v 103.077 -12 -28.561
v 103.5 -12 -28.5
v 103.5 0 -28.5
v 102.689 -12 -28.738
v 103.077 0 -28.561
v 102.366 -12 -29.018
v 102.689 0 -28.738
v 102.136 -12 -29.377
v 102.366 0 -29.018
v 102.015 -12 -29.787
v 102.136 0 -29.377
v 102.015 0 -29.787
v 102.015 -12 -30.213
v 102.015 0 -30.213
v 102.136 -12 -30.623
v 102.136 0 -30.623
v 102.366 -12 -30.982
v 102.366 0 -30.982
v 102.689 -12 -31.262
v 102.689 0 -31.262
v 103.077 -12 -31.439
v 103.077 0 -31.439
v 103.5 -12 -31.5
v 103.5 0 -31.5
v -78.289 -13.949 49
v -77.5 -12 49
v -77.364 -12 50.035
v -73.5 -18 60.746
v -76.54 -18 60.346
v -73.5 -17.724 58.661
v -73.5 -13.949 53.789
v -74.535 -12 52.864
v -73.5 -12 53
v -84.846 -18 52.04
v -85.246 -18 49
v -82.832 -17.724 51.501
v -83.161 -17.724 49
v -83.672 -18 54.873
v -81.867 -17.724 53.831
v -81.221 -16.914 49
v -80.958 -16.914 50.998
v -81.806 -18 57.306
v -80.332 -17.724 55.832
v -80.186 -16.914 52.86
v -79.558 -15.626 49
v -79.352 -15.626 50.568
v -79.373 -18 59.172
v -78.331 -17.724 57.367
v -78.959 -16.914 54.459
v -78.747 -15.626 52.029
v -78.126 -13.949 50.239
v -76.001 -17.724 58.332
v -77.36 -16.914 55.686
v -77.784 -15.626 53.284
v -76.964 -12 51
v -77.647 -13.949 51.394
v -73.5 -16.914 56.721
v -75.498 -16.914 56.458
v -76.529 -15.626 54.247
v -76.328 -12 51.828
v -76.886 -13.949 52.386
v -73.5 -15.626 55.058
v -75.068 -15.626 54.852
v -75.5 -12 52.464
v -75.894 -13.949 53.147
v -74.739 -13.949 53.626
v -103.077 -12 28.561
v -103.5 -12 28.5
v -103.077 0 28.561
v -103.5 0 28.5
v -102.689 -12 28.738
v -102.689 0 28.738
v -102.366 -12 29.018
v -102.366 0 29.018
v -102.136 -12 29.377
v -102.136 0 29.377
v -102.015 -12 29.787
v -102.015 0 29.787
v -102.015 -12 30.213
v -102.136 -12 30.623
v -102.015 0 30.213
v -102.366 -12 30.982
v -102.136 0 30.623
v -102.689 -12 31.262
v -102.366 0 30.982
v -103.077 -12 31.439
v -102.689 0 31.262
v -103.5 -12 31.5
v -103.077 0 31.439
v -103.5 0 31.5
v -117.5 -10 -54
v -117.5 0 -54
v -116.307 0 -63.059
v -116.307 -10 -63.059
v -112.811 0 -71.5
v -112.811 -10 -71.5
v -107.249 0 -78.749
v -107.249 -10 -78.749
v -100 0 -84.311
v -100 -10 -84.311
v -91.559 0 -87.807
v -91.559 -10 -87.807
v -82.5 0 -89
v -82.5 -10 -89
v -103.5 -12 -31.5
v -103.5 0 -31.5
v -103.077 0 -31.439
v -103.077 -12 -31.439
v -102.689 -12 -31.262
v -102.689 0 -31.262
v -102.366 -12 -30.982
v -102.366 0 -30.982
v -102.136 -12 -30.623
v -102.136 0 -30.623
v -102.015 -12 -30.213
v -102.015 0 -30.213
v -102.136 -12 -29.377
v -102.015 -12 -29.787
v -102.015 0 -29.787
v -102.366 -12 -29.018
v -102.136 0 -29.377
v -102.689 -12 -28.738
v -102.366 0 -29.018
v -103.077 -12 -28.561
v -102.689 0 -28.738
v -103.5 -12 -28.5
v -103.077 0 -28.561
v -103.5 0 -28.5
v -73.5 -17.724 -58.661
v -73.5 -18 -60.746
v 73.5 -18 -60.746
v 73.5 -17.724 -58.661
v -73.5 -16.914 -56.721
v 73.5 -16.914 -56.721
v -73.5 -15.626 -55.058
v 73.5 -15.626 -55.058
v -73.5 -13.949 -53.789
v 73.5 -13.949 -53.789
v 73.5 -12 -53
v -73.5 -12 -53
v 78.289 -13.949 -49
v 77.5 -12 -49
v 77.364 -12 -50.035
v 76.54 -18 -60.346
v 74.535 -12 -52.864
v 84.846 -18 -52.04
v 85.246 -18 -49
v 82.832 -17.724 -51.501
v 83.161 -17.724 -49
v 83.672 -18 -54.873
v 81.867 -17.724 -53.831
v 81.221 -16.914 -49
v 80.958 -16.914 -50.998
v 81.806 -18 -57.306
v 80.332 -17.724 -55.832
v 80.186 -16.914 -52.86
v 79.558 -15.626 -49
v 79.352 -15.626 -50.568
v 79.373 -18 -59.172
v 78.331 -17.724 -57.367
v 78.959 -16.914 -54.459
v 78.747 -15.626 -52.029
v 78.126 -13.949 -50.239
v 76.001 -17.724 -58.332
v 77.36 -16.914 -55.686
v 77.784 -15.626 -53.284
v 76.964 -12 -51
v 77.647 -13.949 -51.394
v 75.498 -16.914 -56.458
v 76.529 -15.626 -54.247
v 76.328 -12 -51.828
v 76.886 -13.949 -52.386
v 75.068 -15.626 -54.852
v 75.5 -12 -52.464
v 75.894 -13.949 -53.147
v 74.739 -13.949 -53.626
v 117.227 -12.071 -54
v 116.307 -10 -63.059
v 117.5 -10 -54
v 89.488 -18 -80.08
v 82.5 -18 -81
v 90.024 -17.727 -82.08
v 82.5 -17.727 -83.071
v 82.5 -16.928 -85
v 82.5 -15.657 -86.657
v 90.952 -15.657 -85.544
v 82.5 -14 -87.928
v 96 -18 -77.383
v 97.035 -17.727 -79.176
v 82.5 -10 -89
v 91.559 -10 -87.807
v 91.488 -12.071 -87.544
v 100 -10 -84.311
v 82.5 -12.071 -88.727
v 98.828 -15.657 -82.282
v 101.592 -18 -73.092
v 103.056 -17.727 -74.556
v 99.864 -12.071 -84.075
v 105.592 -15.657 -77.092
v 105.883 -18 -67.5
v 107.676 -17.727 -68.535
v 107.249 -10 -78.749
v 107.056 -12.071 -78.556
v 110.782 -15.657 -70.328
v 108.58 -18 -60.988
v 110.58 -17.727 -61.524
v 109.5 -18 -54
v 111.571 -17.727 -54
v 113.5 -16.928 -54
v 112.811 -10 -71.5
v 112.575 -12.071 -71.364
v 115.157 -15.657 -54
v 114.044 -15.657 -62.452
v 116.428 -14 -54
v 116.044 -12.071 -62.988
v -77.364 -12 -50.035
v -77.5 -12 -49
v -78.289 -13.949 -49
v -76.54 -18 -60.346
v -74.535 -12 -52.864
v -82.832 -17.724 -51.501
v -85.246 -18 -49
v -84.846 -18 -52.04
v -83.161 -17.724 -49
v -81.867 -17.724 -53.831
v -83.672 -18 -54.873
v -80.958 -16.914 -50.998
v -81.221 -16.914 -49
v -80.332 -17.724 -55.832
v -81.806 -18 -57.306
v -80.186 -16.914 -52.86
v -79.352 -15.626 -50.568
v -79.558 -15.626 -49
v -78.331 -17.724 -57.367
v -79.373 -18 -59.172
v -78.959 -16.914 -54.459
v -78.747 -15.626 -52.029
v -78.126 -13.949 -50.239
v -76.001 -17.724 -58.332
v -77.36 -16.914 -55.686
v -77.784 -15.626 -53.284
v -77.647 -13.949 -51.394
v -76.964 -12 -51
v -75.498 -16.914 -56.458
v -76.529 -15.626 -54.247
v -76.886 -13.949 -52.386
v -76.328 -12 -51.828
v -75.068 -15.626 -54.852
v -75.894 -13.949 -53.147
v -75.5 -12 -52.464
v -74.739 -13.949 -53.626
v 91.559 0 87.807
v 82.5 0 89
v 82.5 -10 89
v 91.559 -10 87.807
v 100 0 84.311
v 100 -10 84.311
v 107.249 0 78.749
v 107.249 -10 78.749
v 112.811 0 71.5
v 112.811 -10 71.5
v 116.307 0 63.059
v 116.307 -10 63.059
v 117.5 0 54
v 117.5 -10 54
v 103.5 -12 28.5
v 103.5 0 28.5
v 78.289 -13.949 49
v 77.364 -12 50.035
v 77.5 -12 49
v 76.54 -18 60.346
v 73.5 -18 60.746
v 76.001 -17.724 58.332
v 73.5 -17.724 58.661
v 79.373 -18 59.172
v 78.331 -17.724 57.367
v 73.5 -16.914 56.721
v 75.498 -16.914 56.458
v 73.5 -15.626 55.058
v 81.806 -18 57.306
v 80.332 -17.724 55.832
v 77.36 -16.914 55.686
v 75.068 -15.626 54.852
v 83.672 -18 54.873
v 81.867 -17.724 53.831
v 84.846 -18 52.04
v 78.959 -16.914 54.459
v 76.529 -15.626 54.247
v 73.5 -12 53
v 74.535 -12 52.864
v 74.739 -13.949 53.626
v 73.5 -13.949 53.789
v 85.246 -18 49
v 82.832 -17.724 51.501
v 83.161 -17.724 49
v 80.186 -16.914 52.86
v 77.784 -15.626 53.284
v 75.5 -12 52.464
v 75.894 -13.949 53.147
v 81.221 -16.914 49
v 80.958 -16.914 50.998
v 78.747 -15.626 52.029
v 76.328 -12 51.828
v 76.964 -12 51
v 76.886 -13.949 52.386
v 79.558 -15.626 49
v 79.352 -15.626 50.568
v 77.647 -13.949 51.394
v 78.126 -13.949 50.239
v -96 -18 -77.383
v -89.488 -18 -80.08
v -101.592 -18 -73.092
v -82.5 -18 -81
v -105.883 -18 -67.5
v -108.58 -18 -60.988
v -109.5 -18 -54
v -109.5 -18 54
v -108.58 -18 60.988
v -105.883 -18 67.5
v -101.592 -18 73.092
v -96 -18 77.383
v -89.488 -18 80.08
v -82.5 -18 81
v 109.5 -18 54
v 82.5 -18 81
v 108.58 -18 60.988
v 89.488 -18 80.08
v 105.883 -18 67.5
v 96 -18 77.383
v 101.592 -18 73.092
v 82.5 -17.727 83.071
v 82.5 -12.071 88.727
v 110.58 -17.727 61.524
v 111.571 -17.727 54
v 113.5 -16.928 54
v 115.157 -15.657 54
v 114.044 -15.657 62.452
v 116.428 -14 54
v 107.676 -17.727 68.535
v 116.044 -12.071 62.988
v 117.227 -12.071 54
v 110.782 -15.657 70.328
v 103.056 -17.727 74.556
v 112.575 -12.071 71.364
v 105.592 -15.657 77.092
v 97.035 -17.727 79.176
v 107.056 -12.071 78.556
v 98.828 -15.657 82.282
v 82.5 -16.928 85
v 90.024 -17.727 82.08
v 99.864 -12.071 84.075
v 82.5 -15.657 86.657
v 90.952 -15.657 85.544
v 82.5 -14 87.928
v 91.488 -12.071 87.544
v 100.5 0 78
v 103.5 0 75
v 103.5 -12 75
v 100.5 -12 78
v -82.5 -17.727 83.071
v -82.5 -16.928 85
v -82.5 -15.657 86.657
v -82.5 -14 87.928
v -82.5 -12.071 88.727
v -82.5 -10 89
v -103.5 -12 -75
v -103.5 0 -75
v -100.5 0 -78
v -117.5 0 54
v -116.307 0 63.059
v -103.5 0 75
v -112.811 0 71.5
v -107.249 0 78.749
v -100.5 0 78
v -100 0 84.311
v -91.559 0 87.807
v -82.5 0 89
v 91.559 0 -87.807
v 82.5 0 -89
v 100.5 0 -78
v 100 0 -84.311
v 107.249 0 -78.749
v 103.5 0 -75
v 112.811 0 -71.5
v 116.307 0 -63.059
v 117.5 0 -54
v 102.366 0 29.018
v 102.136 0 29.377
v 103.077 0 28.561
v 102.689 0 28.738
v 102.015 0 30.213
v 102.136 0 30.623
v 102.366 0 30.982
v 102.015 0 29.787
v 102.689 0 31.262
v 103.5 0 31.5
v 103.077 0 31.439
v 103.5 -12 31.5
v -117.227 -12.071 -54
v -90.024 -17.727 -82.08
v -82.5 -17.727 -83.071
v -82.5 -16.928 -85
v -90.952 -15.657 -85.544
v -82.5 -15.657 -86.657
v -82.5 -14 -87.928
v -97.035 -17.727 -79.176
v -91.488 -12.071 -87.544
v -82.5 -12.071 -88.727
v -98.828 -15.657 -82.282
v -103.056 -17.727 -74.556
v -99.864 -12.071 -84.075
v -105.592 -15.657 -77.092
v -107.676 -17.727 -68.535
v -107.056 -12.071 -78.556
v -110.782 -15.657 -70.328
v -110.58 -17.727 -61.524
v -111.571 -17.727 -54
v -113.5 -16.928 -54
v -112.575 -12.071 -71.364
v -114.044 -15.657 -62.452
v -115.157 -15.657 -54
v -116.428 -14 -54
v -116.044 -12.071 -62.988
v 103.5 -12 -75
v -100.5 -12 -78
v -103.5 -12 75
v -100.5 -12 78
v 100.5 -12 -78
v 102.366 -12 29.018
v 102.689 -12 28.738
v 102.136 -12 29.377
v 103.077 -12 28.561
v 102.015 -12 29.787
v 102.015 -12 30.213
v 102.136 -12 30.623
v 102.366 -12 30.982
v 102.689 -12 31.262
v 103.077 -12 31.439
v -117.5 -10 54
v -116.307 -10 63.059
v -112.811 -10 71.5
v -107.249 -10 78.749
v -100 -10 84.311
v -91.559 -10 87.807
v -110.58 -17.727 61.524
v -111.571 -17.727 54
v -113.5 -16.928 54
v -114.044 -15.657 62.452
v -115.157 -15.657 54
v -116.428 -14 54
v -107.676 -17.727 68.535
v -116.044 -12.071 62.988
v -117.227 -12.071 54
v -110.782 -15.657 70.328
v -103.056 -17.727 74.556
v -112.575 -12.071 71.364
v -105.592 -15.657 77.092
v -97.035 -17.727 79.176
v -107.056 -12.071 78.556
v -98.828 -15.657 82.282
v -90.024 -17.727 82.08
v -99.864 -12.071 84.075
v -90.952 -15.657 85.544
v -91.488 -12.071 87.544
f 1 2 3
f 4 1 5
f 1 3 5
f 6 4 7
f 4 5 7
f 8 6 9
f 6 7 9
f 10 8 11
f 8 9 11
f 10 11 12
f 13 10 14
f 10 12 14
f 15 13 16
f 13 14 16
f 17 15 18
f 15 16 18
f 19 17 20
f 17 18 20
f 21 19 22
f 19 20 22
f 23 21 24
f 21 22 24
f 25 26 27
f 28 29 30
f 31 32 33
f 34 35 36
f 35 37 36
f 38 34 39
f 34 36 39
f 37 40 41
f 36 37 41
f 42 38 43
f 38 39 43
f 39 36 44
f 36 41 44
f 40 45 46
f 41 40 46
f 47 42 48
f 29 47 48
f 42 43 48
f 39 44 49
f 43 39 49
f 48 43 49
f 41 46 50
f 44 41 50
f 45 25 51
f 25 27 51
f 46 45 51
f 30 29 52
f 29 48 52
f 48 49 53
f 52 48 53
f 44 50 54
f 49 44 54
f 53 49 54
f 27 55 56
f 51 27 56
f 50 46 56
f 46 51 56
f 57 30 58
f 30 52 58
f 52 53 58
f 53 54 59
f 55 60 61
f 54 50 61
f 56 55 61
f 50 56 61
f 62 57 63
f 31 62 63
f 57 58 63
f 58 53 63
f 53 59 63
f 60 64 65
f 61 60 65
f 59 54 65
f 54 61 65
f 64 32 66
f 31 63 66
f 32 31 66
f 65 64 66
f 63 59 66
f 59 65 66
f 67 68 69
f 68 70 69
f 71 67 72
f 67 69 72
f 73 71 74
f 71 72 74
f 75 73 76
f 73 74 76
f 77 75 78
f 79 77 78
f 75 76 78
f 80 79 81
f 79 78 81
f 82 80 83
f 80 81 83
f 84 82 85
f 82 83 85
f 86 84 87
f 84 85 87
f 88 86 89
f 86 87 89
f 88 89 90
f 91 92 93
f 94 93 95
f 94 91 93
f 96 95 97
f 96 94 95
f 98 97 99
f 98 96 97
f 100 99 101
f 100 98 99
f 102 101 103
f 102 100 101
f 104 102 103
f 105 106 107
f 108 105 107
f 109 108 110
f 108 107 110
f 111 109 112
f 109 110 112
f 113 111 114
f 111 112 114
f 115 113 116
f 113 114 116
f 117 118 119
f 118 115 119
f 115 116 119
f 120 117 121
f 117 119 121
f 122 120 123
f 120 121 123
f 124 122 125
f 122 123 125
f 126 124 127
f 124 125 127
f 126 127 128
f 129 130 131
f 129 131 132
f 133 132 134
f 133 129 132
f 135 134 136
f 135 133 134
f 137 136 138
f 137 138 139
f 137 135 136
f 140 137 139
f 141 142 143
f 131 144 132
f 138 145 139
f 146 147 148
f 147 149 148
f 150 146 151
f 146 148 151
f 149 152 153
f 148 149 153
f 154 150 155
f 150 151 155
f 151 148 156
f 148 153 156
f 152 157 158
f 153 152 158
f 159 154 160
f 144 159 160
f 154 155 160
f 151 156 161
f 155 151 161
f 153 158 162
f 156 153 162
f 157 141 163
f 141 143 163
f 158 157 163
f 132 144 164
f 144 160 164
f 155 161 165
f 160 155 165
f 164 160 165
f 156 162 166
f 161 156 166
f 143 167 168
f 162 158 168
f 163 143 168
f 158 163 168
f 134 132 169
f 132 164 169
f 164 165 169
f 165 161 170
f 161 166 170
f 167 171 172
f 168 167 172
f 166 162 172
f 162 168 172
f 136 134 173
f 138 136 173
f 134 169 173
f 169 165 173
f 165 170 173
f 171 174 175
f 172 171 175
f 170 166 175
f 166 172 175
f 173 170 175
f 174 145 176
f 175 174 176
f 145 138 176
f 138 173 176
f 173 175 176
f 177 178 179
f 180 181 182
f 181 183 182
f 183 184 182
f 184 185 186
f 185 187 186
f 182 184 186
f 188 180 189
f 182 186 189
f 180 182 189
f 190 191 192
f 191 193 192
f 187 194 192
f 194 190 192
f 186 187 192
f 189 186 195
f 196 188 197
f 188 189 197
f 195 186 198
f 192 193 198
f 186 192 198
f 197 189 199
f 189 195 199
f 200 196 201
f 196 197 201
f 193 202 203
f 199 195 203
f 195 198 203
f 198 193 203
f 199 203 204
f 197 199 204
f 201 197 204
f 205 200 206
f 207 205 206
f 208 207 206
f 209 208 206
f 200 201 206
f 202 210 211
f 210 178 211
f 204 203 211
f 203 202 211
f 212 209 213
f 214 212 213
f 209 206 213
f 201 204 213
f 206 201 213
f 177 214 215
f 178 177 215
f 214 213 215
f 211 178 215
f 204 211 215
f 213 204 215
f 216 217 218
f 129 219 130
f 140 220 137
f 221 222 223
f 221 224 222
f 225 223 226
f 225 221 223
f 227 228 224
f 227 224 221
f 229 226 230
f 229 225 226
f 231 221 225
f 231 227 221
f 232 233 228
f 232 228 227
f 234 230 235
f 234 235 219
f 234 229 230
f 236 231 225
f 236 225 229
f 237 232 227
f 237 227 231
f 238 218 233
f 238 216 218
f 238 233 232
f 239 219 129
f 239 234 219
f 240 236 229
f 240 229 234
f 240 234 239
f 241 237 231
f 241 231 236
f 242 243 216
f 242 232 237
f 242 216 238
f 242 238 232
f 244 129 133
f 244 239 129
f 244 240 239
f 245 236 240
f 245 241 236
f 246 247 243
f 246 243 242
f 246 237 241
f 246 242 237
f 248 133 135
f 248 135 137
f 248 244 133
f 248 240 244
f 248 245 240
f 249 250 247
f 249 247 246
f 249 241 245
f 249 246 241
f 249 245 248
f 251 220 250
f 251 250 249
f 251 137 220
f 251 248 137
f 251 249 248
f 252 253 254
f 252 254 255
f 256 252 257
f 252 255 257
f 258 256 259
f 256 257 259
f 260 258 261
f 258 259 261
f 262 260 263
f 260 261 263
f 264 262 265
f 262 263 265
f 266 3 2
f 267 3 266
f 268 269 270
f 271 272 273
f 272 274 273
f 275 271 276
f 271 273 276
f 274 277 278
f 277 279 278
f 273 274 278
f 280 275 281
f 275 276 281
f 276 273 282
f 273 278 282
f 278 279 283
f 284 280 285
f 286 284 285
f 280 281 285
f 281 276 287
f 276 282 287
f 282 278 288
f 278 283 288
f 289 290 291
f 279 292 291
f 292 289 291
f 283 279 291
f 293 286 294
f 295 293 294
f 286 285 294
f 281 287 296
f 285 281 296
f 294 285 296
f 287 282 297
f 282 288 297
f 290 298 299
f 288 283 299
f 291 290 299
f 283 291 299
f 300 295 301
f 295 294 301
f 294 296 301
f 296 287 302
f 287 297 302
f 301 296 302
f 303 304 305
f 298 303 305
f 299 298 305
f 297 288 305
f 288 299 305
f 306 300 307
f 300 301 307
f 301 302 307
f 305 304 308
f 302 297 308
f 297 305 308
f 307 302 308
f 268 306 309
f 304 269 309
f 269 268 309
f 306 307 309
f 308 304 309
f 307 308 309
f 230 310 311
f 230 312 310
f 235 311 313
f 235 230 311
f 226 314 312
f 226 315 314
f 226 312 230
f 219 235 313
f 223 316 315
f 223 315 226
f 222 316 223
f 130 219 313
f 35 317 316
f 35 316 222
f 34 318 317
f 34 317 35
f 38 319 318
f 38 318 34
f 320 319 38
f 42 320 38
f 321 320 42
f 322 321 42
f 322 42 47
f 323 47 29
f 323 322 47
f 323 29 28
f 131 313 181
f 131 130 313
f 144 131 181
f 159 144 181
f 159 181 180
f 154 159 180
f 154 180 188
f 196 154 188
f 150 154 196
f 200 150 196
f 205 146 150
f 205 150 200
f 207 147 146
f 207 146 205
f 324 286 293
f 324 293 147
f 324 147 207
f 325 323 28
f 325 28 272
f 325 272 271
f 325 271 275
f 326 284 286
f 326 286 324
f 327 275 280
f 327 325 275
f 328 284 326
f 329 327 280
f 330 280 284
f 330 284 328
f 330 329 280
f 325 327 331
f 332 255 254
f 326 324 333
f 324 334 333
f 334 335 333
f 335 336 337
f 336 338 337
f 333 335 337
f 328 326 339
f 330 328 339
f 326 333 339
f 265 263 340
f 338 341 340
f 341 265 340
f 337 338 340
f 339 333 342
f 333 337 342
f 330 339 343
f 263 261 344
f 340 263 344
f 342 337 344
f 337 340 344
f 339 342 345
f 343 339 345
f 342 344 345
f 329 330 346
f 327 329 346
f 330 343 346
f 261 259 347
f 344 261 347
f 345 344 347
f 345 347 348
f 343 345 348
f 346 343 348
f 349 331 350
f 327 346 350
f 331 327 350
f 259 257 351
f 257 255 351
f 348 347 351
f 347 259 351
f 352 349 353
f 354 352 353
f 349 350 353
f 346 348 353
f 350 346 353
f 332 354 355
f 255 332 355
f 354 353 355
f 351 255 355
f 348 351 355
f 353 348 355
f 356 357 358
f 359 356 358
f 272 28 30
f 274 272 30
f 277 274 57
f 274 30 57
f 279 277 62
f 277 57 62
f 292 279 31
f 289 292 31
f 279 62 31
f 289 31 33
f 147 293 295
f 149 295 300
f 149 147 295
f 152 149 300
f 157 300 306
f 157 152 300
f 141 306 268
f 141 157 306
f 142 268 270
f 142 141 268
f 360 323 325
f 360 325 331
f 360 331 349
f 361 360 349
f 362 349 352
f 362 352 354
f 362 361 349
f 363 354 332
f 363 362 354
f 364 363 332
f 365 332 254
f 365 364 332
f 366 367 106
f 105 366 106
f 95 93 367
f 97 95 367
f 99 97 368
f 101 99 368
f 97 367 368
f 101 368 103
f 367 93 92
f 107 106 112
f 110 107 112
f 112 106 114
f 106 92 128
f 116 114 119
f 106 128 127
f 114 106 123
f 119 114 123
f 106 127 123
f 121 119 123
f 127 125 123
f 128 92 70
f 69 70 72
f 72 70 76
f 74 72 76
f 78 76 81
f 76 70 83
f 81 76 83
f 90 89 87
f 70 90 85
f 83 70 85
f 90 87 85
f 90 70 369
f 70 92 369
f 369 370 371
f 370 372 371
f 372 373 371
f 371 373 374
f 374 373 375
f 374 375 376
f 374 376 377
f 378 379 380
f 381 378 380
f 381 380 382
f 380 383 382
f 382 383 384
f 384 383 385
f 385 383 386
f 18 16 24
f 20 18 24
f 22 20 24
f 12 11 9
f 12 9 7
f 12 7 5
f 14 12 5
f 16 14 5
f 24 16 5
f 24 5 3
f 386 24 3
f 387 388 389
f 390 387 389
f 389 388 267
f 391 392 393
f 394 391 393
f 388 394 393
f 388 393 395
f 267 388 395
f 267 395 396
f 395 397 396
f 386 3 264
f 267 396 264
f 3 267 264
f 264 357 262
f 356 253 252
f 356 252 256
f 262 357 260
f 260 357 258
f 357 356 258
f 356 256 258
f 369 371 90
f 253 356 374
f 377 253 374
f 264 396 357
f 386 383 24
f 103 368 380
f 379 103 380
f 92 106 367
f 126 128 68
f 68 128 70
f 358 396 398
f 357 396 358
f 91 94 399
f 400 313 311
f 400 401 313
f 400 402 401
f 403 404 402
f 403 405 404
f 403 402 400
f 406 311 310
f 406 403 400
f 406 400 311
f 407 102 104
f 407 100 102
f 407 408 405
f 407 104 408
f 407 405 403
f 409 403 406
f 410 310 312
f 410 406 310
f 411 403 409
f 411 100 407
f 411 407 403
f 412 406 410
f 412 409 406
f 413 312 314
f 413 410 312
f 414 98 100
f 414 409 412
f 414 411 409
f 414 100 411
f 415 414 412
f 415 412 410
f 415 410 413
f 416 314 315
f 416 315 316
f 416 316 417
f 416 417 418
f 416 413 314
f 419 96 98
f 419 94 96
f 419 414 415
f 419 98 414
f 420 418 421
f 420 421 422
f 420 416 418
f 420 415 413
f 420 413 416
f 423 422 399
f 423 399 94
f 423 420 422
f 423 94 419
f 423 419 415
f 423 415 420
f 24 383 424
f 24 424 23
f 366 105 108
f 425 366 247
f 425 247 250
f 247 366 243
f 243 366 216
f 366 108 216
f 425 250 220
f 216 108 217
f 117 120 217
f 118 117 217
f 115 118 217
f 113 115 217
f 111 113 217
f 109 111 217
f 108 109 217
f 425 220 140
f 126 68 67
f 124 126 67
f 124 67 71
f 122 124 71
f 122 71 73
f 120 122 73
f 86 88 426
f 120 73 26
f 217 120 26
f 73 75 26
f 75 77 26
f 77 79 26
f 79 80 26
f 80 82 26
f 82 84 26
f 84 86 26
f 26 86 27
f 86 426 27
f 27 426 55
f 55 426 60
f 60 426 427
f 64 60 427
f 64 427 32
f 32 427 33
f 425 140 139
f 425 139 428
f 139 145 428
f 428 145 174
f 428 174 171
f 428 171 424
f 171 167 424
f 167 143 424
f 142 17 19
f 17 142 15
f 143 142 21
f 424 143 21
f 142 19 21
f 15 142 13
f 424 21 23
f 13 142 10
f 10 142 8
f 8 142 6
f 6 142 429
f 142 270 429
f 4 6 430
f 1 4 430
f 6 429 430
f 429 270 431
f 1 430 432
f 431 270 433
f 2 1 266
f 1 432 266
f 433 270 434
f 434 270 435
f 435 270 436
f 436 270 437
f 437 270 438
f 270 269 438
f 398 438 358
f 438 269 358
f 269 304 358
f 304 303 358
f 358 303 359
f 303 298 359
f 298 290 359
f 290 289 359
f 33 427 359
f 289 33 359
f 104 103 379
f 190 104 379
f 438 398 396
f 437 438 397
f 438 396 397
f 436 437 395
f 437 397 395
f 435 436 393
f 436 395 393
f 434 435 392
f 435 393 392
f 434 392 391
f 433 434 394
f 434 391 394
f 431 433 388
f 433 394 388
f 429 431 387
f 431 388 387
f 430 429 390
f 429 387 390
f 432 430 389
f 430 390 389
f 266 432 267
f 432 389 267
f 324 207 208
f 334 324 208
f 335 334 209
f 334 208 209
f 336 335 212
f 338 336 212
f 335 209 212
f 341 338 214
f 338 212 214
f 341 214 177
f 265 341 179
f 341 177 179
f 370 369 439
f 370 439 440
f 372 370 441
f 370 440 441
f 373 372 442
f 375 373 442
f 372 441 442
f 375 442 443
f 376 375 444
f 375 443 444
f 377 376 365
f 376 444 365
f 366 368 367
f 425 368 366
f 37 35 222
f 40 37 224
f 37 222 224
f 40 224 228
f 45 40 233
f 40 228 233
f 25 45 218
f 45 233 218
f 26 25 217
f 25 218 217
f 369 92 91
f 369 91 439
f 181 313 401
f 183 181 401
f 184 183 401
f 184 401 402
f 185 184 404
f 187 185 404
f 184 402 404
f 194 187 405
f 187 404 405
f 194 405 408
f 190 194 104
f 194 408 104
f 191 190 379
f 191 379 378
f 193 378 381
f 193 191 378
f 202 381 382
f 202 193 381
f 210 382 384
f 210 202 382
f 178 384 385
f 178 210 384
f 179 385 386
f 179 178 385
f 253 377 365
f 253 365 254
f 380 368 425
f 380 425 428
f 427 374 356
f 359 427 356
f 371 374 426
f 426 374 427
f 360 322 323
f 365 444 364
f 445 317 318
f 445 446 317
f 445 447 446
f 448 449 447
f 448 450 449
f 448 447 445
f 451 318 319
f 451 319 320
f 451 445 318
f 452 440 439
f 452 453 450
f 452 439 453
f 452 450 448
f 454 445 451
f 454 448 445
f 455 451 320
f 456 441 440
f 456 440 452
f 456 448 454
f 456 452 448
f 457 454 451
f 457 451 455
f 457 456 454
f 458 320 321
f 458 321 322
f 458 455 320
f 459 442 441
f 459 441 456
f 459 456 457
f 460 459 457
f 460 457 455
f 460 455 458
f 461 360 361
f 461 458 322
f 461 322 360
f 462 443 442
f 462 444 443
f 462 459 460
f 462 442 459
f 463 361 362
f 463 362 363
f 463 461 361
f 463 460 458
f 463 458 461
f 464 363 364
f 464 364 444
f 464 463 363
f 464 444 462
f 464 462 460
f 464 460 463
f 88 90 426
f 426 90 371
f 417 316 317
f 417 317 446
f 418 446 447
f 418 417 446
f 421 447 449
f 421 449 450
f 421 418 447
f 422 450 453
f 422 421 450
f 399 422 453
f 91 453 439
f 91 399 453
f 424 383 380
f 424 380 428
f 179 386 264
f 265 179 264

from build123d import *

# Parameters (mm, degrees)
F0_W         = 235
F0_H         = 178
F0_W_2       = 207
F0_H_2       = 156
F0_W_3       = 155
F0_H_3       = 106
F1_DEPTH     = 18
F2_DEPTH     = 12
F3_R         = 35
F4_R         = 4
F5_T1_DEPTH  = 98
F5_T3_DEPTH  = 147
F5_T5_DEPTH  = 165
F5_T7_DEPTH  = 108
F5_T10_ANGLE = 90
F5_T12_ANGLE = 90
F5_T14_ANGLE = 90
F5_T16_ANGLE = 90
F5_T18_ANGLE = 90
F5_T20_ANGLE = 90
F5_T22_ANGLE = 90
F5_T24_ANGLE = 90
F6_SIZE      = 3
F7_R         = 1.5
F8_DEPTH     = 16


# Not quite as in the source:
# - a fillet or chamfer that OpenCascade refuses, or shapes differently, is made with other operations: its cross-section is extruded or revolved along the edge and cut away or added


with BuildPart() as f1:
    # F0 (on Front) → F1 (new body)
    with BuildSketch(Plane.XZ):
        Rectangle(F0_W, F0_H)
        Rectangle(F0_W_2, F0_H_2, mode=Mode.SUBTRACT)
        Rectangle(F0_W_2, F0_H_2)
        Rectangle(F0_W_3, F0_H_3, mode=Mode.SUBTRACT)
    extrude(amount=F1_DEPTH)

    # F0 (on Front) → F2 (cut)
    with BuildSketch(Plane.XZ):
        Rectangle(F0_W_2, F0_H_2)
        Rectangle(F0_W_3, F0_H_3, mode=Mode.SUBTRACT)
    extrude(amount=F2_DEPTH, mode=Mode.SUBTRACT)

    # F3
    f3_edges = [f1.edges().sort_by_distance(p)[0] for p in [
        (117.5, -9, 89),
        (-117.5, -9, 89),
        (117.5, -9, -89),
        (-117.5, -9, -89),
    ]]
    fillet(f3_edges, radius=F3_R)

    # F4
    f4_edges = [f1.edges().sort_by_distance(p)[0] for p in [
        (-77.5, -15, 53),
        (77.5, -15, 53),
        (77.5, -15, -53),
        (-77.5, -15, -53),
    ]]
    fillet(f4_edges, radius=F4_R)

    # F5: fillet of radius 8 on 16 edges, made by hand

    # F5_s2 → F5_t1 (cut)
    with BuildSketch(Plane.XY.offset(-49)):
        with BuildLine():
            ThreePointArc((-85.2459666924, -18), (-80.3469872068, -16.3245553203), (-77.5, -12))
            Line((-77.5, -12), (-77.5, -18))
            Line((-77.5, -18), (-85.2459666924, -18))
        make_face()
        with BuildLine():
            ThreePointArc((85.2459666924, -18), (80.3469872068, -16.3245553203), (77.5, -12))
            Line((77.5, -12), (77.5, -18))
            Line((77.5, -18), (85.2459666924, -18))
        make_face()
    extrude(amount=F5_T1_DEPTH, mode=Mode.SUBTRACT)

    # F5_s4 → F5_t3 (cut)
    with BuildSketch(Plane.YZ.offset(-73.5)):
        with BuildLine():
            ThreePointArc((-18, -60.7459666924), (-16.3245553203, -55.8469872068), (-12, -53))
            Line((-12, -53), (-18, -53))
            Line((-18, -53), (-18, -60.7459666924))
        make_face()
        with BuildLine():
            ThreePointArc((-18, 60.7459666924), (-16.3245553203, 55.8469872068), (-12, 53))
            Line((-12, 53), (-18, 53))
            Line((-18, 53), (-18, 60.7459666924))
        make_face()
    extrude(amount=F5_T3_DEPTH, mode=Mode.SUBTRACT)

    # F5_s6 → F5_t5 (cut)
    with BuildSketch(Plane.YZ.offset(-82.5)):
        with BuildLine():
            ThreePointArc((-18, -81), (-15.6568542495, -86.6568542495), (-10, -89))
            Line((-10, -89), (-18, -89))
            Line((-18, -89), (-18, -81))
        make_face()
        with BuildLine():
            ThreePointArc((-18, 81), (-15.6568542495, 86.6568542495), (-10, 89))
            Line((-10, 89), (-18, 89))
            Line((-18, 89), (-18, 81))
        make_face()
    extrude(amount=F5_T5_DEPTH, mode=Mode.SUBTRACT)

    # F5_s8 → F5_t7 (cut)
    with BuildSketch(Plane.XY.offset(-54)):
        with BuildLine():
            ThreePointArc((-109.5, -18), (-115.1568542495, -15.6568542495), (-117.5, -10))
            Line((-117.5, -10), (-117.5, -18))
            Line((-117.5, -18), (-109.5, -18))
        make_face()
        with BuildLine():
            ThreePointArc((109.5, -18), (115.1568542495, -15.6568542495), (117.5, -10))
            Line((117.5, -10), (117.5, -18))
            Line((117.5, -18), (109.5, -18))
        make_face()
    extrude(amount=F5_T7_DEPTH, mode=Mode.SUBTRACT)

    # F5_s9 → F5_t10 (revolve, cut)
    with BuildSketch(Plane.XY.offset(-49)):
        with BuildLine():
            ThreePointArc((-85.2459666924, -18), (-80.3469872068, -16.3245553203), (-77.5, -12))
            Line((-77.5, -12), (-77.5, -18))
            Line((-77.5, -18), (-85.2459666924, -18))
        make_face()
    revolve(axis=Axis((-73.5, -18, -49), (0, -1, 0)), revolution_arc=F5_T10_ANGLE, mode=Mode.SUBTRACT)

    # F5_s11 → F5_t12 (revolve, cut)
    with BuildSketch(Plane.XY.offset(49)):
        with BuildLine():
            ThreePointArc((-85.2459666924, -18), (-80.3469872068, -16.3245553203), (-77.5, -12))
            Line((-77.5, -12), (-77.5, -18))
            Line((-77.5, -18), (-85.2459666924, -18))
        make_face()
    revolve(axis=Axis((-73.5, -18, 49), (0, 1, 0)), revolution_arc=F5_T12_ANGLE, mode=Mode.SUBTRACT)

    # F5_s13 → F5_t14 (revolve, cut)
    with BuildSketch(Plane.XY.offset(-49)):
        with BuildLine():
            ThreePointArc((85.2459666924, -18), (80.3469872068, -16.3245553203), (77.5, -12))
            Line((77.5, -12), (77.5, -18))
            Line((77.5, -18), (85.2459666924, -18))
        make_face()
    revolve(axis=Axis((73.5, -18, -49), (0, 1, 0)), revolution_arc=F5_T14_ANGLE, mode=Mode.SUBTRACT)

    # F5_s15 → F5_t16 (revolve, cut)
    with BuildSketch(Plane.YZ.offset(73.5)):
        with BuildLine():
            ThreePointArc((-18, 60.7459666924), (-16.3245553203, 55.8469872068), (-12, 53))
            Line((-12, 53), (-18, 53))
            Line((-18, 53), (-18, 60.7459666924))
        make_face()
    revolve(axis=Axis((73.5, -18, 49), (0, 1, 0)), revolution_arc=F5_T16_ANGLE, mode=Mode.SUBTRACT)

    # F5_s17 → F5_t18 (revolve, cut)
    with BuildSketch(Plane.YZ.offset(-82.5)):
        with BuildLine():
            ThreePointArc((-18, -81), (-15.6568542495, -86.6568542495), (-10, -89))
            Line((-10, -89), (-18, -89))
            Line((-18, -89), (-18, -81))
        make_face()
    revolve(axis=Axis((-82.5, -18, -54), (0, 1, 0)), revolution_arc=F5_T18_ANGLE, mode=Mode.SUBTRACT)

    # F5_s19 → F5_t20 (revolve, cut)
    with BuildSketch(Plane.YZ.offset(82.5)):
        with BuildLine():
            ThreePointArc((-18, -81), (-15.6568542495, -86.6568542495), (-10, -89))
            Line((-10, -89), (-18, -89))
            Line((-18, -89), (-18, -81))
        make_face()
    revolve(axis=Axis((82.5, -18, -54), (0, -1, 0)), revolution_arc=F5_T20_ANGLE, mode=Mode.SUBTRACT)

    # F5_s21 → F5_t22 (revolve, cut)
    with BuildSketch(Plane.XY.offset(54)):
        with BuildLine():
            ThreePointArc((-109.5, -18), (-115.1568542495, -15.6568542495), (-117.5, -10))
            Line((-117.5, -10), (-117.5, -18))
            Line((-117.5, -18), (-109.5, -18))
        make_face()
    revolve(axis=Axis((-82.5, -18, 54), (0, 1, 0)), revolution_arc=F5_T22_ANGLE, mode=Mode.SUBTRACT)

    # F5_s23 → F5_t24 (revolve, cut)
    with BuildSketch(Plane.XY.offset(54)):
        with BuildLine():
            ThreePointArc((109.5, -18), (115.1568542495, -15.6568542495), (117.5, -10))
            Line((117.5, -10), (117.5, -18))
            Line((117.5, -18), (109.5, -18))
        make_face()
    revolve(axis=Axis((82.5, -18, 54), (0, -1, 0)), revolution_arc=F5_T24_ANGLE, mode=Mode.SUBTRACT)

    # F6
    f6_edges = [f1.edges().sort_by_distance(p)[0] for p in [
        (-103.5, -6, -78),
        (103.5, -6, -78),
        (-103.5, -6, 78),
        (103.5, -6, 78),
    ]]
    chamfer(f6_edges, length=F6_SIZE)

    # F7 (on face) → F8 (join)
    with BuildSketch(Plane.XZ):
        with Locations((-103.5, -30)):
            Circle(F7_R)
        with Locations((-103.5, 30)):
            Circle(F7_R)
        with Locations((103.5, -30)):
            Circle(F7_R)
        with Locations((103.5, 30)):
            Circle(F7_R)
    extrude(amount=F8_DEPTH)


solid = f1.part
